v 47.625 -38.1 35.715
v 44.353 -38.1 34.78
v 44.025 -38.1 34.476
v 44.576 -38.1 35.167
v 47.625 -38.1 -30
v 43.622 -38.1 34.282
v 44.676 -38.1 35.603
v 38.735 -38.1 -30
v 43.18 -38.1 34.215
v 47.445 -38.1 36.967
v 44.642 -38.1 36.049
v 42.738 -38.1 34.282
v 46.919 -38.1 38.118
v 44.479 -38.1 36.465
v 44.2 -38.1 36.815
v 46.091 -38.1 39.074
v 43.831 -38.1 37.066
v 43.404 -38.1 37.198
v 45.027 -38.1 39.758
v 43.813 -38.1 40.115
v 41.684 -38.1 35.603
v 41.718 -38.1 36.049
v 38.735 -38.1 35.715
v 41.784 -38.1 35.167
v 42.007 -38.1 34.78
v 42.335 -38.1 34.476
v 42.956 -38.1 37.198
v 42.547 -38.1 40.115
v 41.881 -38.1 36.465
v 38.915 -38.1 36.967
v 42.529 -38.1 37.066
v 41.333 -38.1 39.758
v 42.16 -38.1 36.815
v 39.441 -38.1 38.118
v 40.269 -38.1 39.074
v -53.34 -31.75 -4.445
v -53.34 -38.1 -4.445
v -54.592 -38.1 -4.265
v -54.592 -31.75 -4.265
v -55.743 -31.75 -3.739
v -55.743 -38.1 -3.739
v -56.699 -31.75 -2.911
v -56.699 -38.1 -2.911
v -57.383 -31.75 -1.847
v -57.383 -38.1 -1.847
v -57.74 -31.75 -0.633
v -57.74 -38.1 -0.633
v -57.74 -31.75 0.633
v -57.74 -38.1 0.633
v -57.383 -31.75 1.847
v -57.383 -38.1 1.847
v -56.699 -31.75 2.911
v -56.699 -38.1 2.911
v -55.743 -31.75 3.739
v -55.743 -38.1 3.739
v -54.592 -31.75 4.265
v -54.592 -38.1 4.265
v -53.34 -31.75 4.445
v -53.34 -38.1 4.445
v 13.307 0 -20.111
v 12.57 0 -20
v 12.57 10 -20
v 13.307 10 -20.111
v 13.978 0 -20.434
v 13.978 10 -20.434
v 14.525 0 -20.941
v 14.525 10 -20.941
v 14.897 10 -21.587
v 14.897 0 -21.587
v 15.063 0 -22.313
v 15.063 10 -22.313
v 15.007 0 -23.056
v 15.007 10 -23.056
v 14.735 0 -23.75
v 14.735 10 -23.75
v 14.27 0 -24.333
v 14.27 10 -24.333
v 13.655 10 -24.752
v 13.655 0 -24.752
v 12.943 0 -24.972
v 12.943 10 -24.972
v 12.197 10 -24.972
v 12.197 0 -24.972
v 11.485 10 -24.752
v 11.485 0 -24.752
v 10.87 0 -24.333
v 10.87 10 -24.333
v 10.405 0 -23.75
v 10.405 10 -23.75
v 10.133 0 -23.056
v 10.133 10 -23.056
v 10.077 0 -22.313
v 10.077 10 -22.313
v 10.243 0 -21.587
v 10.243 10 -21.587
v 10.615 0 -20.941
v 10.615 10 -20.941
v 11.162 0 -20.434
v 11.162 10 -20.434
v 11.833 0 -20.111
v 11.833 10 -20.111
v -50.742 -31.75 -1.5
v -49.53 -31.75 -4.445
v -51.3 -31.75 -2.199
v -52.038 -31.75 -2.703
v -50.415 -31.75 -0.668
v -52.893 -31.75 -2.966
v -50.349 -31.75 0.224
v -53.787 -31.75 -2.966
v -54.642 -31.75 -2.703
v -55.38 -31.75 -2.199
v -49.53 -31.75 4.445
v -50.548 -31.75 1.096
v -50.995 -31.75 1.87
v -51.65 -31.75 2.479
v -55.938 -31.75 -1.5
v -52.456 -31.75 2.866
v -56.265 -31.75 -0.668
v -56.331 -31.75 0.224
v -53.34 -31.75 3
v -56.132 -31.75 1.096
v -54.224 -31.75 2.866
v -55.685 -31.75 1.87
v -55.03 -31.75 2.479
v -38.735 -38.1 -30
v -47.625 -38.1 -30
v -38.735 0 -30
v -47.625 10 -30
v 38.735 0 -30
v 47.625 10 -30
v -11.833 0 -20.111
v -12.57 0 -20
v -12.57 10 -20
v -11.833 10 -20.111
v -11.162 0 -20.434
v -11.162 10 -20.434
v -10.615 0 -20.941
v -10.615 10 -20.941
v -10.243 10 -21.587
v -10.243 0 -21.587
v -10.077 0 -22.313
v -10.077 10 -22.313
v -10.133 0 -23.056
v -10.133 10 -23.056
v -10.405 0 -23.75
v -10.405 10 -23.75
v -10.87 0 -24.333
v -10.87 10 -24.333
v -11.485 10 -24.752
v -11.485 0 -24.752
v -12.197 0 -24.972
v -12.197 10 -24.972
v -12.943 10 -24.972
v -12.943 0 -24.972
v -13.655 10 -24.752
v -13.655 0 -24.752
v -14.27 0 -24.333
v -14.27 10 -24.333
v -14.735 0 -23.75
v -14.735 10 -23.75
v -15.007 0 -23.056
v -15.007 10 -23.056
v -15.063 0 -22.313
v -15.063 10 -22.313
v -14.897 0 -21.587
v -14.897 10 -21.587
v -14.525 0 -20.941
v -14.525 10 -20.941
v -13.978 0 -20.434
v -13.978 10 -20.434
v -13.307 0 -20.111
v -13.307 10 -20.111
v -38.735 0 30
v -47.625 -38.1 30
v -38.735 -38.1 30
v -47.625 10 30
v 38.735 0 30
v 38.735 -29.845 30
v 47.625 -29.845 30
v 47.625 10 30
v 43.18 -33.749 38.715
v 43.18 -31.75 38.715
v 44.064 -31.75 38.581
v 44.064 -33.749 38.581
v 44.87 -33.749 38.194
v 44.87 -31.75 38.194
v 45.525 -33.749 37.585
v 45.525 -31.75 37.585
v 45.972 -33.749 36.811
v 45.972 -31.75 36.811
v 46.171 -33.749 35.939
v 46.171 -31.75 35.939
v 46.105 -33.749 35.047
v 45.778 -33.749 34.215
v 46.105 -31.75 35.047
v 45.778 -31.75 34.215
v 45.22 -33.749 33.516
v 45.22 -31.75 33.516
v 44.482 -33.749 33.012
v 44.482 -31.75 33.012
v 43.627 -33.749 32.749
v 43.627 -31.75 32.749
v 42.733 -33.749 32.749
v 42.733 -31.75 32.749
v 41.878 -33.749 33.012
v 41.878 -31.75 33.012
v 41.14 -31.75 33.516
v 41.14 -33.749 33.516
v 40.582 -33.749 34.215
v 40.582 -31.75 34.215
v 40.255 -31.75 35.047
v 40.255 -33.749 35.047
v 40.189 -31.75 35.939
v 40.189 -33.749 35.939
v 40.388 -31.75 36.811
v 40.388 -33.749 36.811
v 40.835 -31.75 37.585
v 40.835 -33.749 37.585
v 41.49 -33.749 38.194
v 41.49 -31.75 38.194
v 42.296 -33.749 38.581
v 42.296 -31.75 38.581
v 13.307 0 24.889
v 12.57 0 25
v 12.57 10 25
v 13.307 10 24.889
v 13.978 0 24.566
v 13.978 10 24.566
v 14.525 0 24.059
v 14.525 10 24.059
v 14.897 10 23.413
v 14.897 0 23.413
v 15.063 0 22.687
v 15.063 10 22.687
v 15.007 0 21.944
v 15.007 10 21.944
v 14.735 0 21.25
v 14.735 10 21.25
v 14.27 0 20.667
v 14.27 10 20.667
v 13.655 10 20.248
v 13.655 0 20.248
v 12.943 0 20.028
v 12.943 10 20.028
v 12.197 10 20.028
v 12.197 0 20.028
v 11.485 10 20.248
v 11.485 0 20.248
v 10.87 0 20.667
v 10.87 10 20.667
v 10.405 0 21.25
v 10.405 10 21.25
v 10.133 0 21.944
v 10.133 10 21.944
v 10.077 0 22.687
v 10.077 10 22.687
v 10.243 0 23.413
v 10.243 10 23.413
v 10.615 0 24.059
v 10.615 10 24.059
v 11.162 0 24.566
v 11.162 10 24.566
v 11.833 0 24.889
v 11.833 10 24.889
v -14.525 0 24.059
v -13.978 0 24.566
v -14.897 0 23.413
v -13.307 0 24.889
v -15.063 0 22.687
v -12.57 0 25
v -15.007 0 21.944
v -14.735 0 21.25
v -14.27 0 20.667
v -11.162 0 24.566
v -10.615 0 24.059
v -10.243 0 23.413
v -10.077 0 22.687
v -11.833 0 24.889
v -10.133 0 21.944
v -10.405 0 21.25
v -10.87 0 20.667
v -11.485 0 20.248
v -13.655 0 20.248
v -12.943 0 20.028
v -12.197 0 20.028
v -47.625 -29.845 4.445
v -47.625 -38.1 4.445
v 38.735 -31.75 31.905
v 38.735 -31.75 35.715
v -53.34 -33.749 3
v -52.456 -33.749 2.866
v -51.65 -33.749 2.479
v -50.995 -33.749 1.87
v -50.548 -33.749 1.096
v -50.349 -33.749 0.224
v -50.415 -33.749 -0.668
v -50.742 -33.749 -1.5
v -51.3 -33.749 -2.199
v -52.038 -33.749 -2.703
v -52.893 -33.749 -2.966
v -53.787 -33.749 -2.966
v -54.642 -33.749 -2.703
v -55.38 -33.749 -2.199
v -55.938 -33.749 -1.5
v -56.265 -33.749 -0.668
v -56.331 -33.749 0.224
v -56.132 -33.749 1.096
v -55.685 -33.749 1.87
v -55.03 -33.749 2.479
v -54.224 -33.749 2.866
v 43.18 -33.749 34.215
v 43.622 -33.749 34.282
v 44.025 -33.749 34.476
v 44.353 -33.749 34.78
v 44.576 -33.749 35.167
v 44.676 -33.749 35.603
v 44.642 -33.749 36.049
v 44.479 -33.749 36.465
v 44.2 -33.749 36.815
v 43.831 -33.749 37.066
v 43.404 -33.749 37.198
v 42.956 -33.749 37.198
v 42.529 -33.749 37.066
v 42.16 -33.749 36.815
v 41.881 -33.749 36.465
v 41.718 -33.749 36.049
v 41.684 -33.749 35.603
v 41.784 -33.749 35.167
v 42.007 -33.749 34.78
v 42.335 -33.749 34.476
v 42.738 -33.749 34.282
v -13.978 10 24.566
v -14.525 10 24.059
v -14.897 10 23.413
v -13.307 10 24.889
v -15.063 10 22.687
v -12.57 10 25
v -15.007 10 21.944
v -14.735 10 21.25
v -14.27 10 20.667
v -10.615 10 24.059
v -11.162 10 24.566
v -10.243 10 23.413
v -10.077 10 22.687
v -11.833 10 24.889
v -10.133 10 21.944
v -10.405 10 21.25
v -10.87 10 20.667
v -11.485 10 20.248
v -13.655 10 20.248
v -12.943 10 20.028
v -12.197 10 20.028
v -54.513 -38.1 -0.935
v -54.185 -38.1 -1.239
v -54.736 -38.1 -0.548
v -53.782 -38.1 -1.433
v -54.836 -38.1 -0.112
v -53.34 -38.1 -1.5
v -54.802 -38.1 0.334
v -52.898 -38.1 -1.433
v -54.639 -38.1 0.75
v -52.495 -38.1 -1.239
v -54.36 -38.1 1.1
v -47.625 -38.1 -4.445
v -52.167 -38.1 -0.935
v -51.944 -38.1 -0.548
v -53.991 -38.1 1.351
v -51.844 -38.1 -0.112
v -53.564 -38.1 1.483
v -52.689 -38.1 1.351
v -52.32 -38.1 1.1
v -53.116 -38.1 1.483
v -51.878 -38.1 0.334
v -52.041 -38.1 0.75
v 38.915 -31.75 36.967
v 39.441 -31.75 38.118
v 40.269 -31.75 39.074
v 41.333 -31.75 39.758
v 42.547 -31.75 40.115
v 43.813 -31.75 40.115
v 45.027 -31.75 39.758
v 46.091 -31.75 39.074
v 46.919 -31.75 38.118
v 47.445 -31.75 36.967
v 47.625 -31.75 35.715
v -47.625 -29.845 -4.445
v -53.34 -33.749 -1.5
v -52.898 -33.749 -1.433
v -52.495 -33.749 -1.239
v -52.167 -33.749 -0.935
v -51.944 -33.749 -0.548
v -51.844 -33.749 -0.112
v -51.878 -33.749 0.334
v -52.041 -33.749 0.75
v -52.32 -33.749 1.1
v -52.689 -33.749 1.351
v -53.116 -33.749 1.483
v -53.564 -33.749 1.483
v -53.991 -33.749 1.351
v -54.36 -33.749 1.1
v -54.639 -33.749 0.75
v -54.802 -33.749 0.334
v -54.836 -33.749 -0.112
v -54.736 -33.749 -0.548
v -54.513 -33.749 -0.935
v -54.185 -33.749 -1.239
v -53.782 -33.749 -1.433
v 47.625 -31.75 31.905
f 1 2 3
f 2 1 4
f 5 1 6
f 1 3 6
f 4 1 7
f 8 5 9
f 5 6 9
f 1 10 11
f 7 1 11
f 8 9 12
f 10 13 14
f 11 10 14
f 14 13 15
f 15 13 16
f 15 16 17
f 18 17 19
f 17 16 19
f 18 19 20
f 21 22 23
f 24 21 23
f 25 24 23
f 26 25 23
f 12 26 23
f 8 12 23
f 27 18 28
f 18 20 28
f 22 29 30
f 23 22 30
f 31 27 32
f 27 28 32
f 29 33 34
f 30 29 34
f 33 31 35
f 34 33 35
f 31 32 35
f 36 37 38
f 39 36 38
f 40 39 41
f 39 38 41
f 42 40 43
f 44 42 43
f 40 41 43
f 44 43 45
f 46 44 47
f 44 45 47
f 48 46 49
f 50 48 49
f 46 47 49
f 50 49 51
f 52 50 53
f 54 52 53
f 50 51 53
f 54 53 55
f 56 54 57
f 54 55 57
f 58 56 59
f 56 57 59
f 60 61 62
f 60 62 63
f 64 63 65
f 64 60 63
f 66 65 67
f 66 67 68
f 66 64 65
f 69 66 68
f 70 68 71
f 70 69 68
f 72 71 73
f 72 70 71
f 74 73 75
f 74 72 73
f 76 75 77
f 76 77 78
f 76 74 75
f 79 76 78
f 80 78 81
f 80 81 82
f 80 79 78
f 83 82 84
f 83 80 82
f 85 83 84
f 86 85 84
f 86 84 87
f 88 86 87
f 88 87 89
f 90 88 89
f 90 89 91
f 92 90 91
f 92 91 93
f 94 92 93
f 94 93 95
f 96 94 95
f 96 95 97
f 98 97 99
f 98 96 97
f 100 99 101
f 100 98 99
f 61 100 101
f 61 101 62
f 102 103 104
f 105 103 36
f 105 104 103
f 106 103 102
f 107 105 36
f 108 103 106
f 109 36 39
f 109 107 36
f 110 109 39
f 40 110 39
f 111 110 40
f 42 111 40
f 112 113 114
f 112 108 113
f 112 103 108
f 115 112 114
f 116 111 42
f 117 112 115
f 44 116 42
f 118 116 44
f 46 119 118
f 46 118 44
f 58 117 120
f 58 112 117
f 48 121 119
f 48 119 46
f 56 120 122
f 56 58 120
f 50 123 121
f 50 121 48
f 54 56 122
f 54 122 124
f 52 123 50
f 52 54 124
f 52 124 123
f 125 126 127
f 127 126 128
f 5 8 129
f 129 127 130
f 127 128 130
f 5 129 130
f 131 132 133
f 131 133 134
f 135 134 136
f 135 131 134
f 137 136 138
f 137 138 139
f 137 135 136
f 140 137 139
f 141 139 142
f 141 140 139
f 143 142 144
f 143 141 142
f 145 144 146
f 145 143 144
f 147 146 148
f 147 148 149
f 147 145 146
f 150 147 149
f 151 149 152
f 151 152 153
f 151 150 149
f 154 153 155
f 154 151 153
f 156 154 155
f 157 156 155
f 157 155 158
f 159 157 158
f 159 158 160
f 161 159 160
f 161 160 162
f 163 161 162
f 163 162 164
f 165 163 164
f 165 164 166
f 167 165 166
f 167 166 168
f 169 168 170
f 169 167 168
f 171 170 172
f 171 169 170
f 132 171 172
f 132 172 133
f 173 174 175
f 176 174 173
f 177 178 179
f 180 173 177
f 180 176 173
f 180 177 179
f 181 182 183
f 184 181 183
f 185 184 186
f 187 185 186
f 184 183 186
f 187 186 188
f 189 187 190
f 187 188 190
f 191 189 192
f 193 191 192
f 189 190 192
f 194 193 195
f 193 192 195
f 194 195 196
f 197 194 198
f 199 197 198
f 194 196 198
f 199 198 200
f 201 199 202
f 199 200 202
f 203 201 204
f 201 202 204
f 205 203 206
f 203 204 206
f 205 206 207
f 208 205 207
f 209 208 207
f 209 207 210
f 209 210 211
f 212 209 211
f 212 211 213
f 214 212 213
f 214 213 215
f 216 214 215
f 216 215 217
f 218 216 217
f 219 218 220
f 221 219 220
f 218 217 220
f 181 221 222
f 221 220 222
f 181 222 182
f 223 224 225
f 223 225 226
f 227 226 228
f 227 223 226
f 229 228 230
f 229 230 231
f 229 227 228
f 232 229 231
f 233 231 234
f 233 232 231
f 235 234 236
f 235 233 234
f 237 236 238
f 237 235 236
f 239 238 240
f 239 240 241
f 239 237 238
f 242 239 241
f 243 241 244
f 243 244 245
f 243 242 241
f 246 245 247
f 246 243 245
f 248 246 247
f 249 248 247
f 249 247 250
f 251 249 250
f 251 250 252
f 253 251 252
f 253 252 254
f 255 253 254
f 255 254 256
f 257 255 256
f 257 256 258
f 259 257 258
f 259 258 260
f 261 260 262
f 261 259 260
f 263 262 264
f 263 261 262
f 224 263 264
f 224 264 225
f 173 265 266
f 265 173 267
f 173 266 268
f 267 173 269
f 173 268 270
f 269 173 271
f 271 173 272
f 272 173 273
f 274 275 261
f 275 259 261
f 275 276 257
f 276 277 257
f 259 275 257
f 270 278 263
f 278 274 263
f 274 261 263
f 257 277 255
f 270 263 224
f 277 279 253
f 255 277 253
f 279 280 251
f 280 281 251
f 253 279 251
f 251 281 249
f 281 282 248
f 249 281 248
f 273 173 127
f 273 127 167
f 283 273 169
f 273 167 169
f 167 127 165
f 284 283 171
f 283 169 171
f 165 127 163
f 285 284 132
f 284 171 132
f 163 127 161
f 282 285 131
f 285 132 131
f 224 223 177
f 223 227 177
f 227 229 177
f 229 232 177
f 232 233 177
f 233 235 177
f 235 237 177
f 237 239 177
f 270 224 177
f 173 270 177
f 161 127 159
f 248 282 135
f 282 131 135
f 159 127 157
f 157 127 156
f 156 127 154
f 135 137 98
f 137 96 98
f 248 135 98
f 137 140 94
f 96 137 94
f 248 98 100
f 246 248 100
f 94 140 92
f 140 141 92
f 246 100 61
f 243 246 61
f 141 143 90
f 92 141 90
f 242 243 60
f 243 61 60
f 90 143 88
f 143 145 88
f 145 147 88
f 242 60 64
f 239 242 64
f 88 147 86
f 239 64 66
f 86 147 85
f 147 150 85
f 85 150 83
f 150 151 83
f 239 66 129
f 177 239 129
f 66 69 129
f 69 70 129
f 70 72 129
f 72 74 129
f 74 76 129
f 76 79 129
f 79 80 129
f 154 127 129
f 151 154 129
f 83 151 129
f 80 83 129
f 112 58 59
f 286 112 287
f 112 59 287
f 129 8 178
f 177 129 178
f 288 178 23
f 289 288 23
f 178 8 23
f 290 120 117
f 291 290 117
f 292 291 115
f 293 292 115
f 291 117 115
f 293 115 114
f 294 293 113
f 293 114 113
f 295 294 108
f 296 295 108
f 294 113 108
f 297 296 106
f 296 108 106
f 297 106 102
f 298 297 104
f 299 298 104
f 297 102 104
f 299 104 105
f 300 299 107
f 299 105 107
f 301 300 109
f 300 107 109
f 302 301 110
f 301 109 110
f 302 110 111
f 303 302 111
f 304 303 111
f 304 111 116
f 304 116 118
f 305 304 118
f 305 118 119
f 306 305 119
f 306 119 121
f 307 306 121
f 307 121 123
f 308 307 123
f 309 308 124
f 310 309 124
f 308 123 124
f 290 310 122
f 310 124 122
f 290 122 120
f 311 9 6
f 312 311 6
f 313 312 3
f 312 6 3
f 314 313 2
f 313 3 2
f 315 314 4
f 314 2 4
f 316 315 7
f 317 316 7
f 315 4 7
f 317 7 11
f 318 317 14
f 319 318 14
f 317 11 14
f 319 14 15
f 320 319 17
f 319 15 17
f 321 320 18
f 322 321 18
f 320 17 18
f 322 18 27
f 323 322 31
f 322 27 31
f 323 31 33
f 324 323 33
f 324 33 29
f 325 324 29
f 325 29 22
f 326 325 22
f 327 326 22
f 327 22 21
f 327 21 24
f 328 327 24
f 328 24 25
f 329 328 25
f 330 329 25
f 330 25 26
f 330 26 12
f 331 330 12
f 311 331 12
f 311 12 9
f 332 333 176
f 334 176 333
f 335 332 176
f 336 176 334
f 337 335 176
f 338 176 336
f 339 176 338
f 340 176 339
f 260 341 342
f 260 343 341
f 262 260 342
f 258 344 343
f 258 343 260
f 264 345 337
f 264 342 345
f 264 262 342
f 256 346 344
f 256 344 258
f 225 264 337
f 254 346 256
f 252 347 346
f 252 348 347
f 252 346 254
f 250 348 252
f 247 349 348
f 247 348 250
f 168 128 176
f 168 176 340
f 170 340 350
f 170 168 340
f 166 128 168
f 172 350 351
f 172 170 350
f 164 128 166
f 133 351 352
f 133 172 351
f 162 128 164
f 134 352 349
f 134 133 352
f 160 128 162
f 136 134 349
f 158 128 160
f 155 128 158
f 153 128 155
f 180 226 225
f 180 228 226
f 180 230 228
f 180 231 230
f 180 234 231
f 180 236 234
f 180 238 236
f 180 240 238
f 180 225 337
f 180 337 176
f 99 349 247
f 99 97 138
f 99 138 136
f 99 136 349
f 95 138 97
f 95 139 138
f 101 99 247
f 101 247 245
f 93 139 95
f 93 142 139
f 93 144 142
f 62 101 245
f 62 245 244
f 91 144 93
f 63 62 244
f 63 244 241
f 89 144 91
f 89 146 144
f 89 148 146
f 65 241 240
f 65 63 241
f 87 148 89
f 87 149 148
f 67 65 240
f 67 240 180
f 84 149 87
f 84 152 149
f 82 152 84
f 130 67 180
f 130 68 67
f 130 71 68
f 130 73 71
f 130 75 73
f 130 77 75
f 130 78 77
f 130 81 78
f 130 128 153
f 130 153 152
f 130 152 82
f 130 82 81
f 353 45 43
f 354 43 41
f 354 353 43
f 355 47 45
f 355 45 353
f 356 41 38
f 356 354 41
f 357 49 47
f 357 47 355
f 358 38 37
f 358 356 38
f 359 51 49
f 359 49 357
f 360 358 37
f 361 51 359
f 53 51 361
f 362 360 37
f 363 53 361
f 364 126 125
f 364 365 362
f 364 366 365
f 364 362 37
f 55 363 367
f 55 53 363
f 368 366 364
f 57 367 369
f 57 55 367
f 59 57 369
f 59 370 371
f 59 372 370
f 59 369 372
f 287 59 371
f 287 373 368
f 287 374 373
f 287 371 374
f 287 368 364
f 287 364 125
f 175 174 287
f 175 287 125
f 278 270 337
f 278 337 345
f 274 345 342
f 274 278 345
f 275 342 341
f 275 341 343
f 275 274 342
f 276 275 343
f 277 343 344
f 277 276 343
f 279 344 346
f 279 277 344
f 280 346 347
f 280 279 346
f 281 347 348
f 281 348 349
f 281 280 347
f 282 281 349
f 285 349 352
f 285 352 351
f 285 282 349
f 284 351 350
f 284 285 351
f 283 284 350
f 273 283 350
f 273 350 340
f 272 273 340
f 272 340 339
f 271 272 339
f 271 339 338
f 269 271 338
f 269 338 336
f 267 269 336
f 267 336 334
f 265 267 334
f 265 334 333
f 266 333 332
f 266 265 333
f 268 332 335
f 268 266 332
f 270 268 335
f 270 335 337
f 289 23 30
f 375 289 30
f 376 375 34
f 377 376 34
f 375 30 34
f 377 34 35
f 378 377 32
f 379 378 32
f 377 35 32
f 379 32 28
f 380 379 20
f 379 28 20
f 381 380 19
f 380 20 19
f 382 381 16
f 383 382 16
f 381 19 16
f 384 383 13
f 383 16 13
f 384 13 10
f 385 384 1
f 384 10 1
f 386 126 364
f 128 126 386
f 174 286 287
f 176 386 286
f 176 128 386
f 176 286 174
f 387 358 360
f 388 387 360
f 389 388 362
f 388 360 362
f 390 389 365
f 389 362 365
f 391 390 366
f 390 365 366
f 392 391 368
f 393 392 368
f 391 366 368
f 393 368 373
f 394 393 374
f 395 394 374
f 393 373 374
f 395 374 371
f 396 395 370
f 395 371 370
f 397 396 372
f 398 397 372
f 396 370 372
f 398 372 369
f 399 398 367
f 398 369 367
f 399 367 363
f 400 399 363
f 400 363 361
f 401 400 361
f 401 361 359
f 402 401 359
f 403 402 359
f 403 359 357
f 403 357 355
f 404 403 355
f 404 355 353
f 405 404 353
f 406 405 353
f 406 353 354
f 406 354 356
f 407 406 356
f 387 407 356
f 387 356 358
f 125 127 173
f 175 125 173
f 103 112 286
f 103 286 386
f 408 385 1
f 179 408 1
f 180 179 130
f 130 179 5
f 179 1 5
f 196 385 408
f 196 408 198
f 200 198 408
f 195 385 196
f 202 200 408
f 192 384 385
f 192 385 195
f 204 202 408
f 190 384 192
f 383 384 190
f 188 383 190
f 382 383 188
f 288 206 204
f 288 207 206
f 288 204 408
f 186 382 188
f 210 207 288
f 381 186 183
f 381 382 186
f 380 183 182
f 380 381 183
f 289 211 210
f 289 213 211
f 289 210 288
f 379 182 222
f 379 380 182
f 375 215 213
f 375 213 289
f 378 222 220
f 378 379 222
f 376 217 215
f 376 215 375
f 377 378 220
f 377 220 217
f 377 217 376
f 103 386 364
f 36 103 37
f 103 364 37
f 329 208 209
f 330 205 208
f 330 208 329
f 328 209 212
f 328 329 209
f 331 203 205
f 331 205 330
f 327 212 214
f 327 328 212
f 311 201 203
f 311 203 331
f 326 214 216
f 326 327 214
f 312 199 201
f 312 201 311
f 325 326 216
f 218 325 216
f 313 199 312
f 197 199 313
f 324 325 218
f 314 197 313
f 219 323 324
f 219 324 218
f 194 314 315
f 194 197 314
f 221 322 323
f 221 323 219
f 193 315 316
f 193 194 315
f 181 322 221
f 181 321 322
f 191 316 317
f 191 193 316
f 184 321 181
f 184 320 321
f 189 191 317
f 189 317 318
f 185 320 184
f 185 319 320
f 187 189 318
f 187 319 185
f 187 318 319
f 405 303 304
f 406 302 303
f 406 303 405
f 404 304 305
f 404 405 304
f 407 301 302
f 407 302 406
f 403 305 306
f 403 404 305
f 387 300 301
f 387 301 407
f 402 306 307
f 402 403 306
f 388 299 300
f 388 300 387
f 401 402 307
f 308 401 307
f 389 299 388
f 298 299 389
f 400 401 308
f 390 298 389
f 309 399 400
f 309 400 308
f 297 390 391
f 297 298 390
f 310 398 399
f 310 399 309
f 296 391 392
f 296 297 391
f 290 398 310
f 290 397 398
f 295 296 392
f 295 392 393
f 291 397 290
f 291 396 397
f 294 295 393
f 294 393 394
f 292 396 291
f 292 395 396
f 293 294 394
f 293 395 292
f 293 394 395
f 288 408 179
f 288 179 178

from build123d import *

# Parameters (mm, degrees)
SKETCH2_W           = 95.25
SKETCH2_H           = 60
SKETCH2_R           = 2.5
BOSS_EXTRUDE1_DEPTH = 9.99998
SKETCH4_W           = 8.89
SKETCH4_H           = 60
BOSS_EXTRUDE2_DEPTH = 38.1
SKETCH6_R           = 1.5
SKETCH6_R_2         = 1.500000048
BOSS_EXTRUDE3_DEPTH = 6.35
SKETCH8_R           = 2.99974
CUT_EXTRUDE2_DEPTH  = 1.99898
CHAMFER2_SIZE       = 1.905


with BuildPart() as part:
    # Sketch2 → Boss-Extrude1 (new body)
    with BuildSketch(Plane(origin=(0, 0, 0), x_dir=(1, 0, 0), z_dir=(0, 1, 0))):
        Rectangle(SKETCH2_W, SKETCH2_H)
        with Locations(Location((12.57, 22.5, 0), (0, 0, 270))):
            Circle(SKETCH2_R, mode=Mode.SUBTRACT)
        with Locations(Location((-12.57, 22.5, 0), (0, 0, 270))):
            Circle(SKETCH2_R, mode=Mode.SUBTRACT)
        with Locations(Location((12.57, -22.5, 0), (0, 0, 270))):
            Circle(SKETCH2_R, mode=Mode.SUBTRACT)
        with Locations(Location((-12.57, -22.5, 0), (0, 0, 270))):
            Circle(SKETCH2_R, mode=Mode.SUBTRACT)
    extrude(amount=BOSS_EXTRUDE1_DEPTH)

    # Sketch4 → Boss-Extrude2 (add)
    with BuildSketch(Plane.XZ):
        with Locations((-43.18, 0)):
            Rectangle(SKETCH4_W, SKETCH4_H)
        with Locations((43.18, 0)):
            Rectangle(SKETCH4_W, SKETCH4_H)
    extrude(amount=BOSS_EXTRUDE2_DEPTH)

    # Sketch6 → Boss-Extrude3 (add)
    # profile 1 of 2: a face of its own
    with BuildSketch(Plane.XZ.offset(38.1)):
        with BuildLine():
            Line((-47.625, -4.445), (-53.34, -4.445))
            ThreePointArc((-53.34, -4.445), (-57.785, 0), (-53.34, 4.445))
            Line((-53.34, 4.445), (-47.625, 4.445))
            Line((-47.625, 4.445), (-47.625, -4.445))
        make_face()
        with Locations(Location((-53.34, 0, 0), (0, 0, 270))):
            Circle(SKETCH6_R, mode=Mode.SUBTRACT)
    # profile 2 of 2: a face of its own
    with BuildSketch(Plane.XZ.offset(38.1)):
        with BuildLine():
            Line((38.735, 30), (38.735, 35.715))
            ThreePointArc((38.735, 35.715), (43.18, 40.16), (47.625, 35.715))
            Line((47.625, 35.715), (47.625, 30))
            Line((47.625, 30), (38.735, 30))
        make_face()
        with Locations(Location((43.18, 35.715, 0), (0, 0, 270))):
            Circle(SKETCH6_R_2, mode=Mode.SUBTRACT)
    extrude(amount=-BOSS_EXTRUDE3_DEPTH)

    # Sketch8 → Cut-Extrude2 (cut)
    with BuildSketch(Plane(origin=(0, -31.75, 0), x_dir=(1, 0, 0), z_dir=(0, 1, 0))):
        with Locations(Location((43.18, -35.715, 0), (0, 0, 270))):
            Circle(SKETCH8_R)
        with Locations(Location((-53.34, 0, 0), (0, 0, 270))):
            Circle(SKETCH8_R)
    extrude(amount=-CUT_EXTRUDE2_DEPTH, mode=Mode.SUBTRACT)

    # Chamfer2
    chamfer2_edges = [part.edges().sort_by_distance(p)[0] for p in [
        (-47.625, -31.75, 0),
        (43.18, -31.75, 30),
    ]]
    chamfer(chamfer2_edges, length=CHAMFER2_SIZE)


solid = part.part
